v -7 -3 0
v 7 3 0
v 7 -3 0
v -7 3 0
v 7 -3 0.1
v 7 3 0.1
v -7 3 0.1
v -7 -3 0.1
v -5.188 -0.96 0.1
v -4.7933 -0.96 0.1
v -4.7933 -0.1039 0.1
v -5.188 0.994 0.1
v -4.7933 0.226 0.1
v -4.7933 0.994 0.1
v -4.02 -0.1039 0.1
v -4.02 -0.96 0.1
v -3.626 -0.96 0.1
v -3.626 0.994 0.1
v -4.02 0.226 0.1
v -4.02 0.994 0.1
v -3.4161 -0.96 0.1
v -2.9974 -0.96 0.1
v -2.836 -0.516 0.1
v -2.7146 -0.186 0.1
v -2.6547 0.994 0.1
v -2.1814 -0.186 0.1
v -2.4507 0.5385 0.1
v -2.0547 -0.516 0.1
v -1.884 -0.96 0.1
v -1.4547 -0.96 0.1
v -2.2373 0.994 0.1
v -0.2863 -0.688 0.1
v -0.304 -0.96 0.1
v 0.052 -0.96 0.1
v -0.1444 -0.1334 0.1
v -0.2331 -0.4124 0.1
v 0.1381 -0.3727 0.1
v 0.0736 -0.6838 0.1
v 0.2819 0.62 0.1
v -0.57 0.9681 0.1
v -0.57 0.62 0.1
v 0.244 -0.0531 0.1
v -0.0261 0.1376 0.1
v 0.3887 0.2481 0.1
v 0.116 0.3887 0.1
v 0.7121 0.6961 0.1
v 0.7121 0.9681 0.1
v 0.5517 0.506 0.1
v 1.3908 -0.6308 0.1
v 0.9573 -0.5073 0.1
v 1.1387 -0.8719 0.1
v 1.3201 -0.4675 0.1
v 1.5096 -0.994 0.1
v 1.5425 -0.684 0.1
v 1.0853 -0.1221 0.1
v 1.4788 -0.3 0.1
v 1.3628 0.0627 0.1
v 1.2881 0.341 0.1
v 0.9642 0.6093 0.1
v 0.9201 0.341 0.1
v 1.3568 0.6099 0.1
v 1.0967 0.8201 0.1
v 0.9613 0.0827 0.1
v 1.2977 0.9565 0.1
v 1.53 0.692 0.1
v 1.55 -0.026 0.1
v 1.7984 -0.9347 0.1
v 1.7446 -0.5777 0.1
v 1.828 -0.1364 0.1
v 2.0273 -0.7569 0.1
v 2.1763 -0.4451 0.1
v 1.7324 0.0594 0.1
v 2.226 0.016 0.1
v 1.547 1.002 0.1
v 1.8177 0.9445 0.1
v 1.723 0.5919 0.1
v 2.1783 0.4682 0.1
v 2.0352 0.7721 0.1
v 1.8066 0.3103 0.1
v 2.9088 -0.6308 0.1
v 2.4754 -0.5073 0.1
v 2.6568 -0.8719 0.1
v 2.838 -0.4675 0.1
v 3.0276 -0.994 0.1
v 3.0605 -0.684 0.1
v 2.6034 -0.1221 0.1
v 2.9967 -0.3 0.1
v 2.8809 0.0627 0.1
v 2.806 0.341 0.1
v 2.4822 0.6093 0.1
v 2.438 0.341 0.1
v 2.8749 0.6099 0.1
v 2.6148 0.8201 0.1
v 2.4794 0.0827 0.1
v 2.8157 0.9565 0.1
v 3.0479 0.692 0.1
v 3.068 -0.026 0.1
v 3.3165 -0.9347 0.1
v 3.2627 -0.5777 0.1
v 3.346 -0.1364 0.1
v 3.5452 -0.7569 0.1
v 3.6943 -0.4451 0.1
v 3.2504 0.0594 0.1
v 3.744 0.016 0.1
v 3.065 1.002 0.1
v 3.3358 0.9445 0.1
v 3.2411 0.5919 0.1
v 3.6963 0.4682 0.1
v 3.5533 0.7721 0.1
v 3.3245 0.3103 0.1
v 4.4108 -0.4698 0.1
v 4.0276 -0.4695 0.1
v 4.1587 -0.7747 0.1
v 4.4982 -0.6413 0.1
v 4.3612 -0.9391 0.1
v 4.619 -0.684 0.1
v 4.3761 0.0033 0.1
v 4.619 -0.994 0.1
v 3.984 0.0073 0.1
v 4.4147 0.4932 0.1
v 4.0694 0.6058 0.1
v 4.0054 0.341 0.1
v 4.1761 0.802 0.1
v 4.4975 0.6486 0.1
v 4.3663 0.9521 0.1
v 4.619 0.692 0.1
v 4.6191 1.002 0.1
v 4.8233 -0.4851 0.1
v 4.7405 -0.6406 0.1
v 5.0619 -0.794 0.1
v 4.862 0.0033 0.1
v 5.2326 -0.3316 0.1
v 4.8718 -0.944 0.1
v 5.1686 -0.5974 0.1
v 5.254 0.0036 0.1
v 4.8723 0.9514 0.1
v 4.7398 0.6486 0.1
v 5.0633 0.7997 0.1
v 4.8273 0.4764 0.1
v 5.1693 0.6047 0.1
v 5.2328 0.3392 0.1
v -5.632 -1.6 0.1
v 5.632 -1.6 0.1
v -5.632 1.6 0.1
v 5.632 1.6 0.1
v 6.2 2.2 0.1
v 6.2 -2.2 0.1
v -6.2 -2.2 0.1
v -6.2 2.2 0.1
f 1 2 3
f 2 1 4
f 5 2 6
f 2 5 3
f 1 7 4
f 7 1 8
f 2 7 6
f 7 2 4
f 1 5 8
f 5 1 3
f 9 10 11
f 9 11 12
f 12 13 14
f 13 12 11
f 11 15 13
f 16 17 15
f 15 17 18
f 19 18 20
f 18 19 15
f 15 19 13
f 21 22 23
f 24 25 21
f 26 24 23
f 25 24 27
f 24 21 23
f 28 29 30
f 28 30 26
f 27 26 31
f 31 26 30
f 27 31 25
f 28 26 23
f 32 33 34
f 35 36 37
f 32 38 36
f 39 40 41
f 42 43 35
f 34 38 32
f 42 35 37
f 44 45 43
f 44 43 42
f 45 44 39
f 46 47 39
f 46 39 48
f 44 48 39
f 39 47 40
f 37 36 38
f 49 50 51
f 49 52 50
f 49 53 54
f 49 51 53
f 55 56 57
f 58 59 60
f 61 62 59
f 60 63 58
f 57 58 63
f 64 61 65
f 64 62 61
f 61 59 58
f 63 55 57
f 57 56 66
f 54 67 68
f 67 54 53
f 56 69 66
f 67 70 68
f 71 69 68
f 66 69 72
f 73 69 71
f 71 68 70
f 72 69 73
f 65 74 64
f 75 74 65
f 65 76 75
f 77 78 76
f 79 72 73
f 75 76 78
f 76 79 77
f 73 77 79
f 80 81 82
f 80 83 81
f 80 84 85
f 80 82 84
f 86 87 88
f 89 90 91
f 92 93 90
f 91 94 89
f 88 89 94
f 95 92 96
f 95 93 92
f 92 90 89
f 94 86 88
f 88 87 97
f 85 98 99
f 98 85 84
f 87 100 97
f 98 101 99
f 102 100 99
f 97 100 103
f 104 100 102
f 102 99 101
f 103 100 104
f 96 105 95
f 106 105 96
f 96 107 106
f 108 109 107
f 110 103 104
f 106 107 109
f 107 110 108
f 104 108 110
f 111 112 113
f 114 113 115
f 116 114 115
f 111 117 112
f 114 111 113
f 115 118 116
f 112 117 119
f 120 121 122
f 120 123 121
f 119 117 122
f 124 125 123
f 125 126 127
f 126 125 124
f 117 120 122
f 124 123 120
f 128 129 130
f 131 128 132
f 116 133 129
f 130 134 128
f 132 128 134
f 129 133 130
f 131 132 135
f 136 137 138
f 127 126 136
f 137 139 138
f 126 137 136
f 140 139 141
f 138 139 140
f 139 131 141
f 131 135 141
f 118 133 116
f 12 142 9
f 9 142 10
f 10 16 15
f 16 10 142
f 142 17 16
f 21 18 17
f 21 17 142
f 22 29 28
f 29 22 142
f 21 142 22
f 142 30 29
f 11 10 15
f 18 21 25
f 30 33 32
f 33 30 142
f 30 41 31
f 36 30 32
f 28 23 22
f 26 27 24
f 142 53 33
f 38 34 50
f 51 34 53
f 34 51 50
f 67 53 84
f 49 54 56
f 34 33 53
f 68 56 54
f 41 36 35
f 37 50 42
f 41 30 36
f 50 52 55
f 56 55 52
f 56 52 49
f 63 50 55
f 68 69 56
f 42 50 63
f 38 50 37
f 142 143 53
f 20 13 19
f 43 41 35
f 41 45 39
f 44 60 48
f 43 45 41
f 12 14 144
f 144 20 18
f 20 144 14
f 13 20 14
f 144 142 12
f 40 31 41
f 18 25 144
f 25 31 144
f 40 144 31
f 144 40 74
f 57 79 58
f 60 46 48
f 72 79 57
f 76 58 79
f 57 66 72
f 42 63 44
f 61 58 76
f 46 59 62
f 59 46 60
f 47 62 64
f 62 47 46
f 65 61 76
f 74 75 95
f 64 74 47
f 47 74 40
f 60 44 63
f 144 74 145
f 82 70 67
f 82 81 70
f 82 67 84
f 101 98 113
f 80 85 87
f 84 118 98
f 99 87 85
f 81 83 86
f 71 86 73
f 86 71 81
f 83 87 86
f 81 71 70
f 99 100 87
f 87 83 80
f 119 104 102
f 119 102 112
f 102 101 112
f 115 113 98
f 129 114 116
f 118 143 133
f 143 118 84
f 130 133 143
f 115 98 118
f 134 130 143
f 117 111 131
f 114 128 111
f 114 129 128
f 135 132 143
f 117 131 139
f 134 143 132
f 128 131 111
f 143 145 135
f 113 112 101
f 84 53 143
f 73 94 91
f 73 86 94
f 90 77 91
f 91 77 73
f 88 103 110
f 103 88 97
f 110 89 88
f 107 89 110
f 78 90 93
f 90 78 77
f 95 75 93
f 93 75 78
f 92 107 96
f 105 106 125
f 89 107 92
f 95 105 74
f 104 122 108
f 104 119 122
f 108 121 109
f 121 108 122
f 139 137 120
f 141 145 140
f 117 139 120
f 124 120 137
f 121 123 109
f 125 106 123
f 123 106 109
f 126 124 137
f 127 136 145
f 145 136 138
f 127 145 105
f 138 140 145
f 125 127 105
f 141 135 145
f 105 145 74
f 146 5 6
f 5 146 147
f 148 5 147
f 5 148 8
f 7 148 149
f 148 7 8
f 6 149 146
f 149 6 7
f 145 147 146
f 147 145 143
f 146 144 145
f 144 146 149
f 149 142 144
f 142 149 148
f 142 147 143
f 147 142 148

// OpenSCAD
use <../lib.scad>
use <s/59826s01.scad>
function ldraw_lib__59826f() = [
// 0 Sticker  0.8 x  1.8 with "HA 7990"
// 0 Name: 59826f.dat
// 0 Author: J.C. Tchang [tchang]
// 0 !LDRAW_ORG Part UPDATE 2025-09
// 0 !LICENSE Licensed under CC BY 4.0 : see CAreadme.txt
// 
// 0 BFC CERTIFY CCW
  [0,"BFC","CERTIFY"],
  [0,"BFC","CCW"],
// 
// 0 !KEYWORDS BrickLink 7990stk01, Rebrickable 59826
// 
// 0 !HISTORY 2012-03-30 [PTadmin] Official Update 2012-01
// 0 !HISTORY 2025-09-27 [OrionP] Changed winding to CCW
// 0 !HISTORY 2025-09-29 [OrionP] Official Update 2025-09
// 
// 4 15 17.5 0 7.5 17.5 0 -7.5 -17.5 0 -7.5 -17.5 0 7.5
  [4,15,17.5,0,7.5,17.5,0,-7.5,-17.5,0,-7.5,-17.5,0,7.5],
// 4 15 17.5 -0.25 7.5 17.5 -0.25 -7.5 17.5 0 -7.5 17.5 0 7.5
  [4,15,17.5,-0.25,7.5,17.5,-0.25,-7.5,17.5,0,-7.5,17.5,0,7.5],
// 4 15 -17.5 0 7.5 -17.5 0 -7.5 -17.5 -0.25 -7.5 -17.5 -0.25 7.5
  [4,15,-17.5,0,7.5,-17.5,0,-7.5,-17.5,-0.25,-7.5,-17.5,-0.25,7.5],
// 4 15 17.5 0 7.5 -17.5 0 7.5 -17.5 -0.25 7.5 17.5 -0.25 7.5
  [4,15,17.5,0,7.5,-17.5,0,7.5,-17.5,-0.25,7.5,17.5,-0.25,7.5],
// 4 15 17.5 -0.25 -7.5 -17.5 -0.25 -7.5 -17.5 0 -7.5 17.5 0 -7.5
  [4,15,17.5,-0.25,-7.5,-17.5,-0.25,-7.5,-17.5,0,-7.5,17.5,0,-7.5],
// 0 //
// 1 0 0 -0.25 0 0.32 0 0 0 1 0 0 0 0.32 s\59826s01.dat
  [1,0,0,-0.25,0,0.32,0,0,0,1,0,0,0,0.32, ldraw_lib__s__59826s01()],
// 0 //
// 4 0 15.5 -0.25 -5.5 17.5 -0.25 -7.5 17.5 -0.25 7.5 15.5 -0.25 5.5
  [4,0,15.5,-0.25,-5.5,17.5,-0.25,-7.5,17.5,-0.25,7.5,15.5,-0.25,5.5],
// 4 0 -15.5 -0.25 -5.5 -17.5 -0.25 -7.5 17.5 -0.25 -7.5 15.5 -0.25 -5.5
  [4,0,-15.5,-0.25,-5.5,-17.5,-0.25,-7.5,17.5,-0.25,-7.5,15.5,-0.25,-5.5],
// 4 0 -15.5 -0.25 5.5 -17.5 -0.25 7.5 -17.5 -0.25 -7.5 -15.5 -0.25 -5.5
  [4,0,-15.5,-0.25,5.5,-17.5,-0.25,7.5,-17.5,-0.25,-7.5,-15.5,-0.25,-5.5],
// 4 0 15.5 -0.25 5.5 17.5 -0.25 7.5 -17.5 -0.25 7.5 -15.5 -0.25 5.5
  [4,0,15.5,-0.25,5.5,17.5,-0.25,7.5,-17.5,-0.25,7.5,-15.5,-0.25,5.5],
// 4 15 15.5 -0.25 5.5 14.08 -0.25 4 14.08 -0.25 -4 15.5 -0.25 -5.5
  [4,15,15.5,-0.25,5.5,14.08,-0.25,4,14.08,-0.25,-4,15.5,-0.25,-5.5],
// 4 15 -15.5 -0.25 5.5 -14.08 -0.25 4 14.08 -0.25 4 15.5 -0.25 5.5
  [4,15,-15.5,-0.25,5.5,-14.08,-0.25,4,14.08,-0.25,4,15.5,-0.25,5.5],
// 4 15 -15.5 -0.25 -5.5 -14.08 -0.25 -4 -14.08 -0.25 4 -15.5 -0.25 5.5
  [4,15,-15.5,-0.25,-5.5,-14.08,-0.25,-4,-14.08,-0.25,4,-15.5,-0.25,5.5],
// 4 15 15.5 -0.25 -5.5 14.08 -0.25 -4 -14.08 -0.25 -4 -15.5 -0.25 -5.5
  [4,15,15.5,-0.25,-5.5,14.08,-0.25,-4,-14.08,-0.25,-4,-15.5,-0.25,-5.5],
// 0 //
];
module ldraw_lib__59826f(step=0, col=false, unit=2/5, alt=false, line=0.2, solid=!$preview)
    makepoly(ldraw_lib__59826f(), step=step, col=col, unit=unit, alt=alt, line=line, solid=solid);
ldraw_lib__59826f(line=0.2);
